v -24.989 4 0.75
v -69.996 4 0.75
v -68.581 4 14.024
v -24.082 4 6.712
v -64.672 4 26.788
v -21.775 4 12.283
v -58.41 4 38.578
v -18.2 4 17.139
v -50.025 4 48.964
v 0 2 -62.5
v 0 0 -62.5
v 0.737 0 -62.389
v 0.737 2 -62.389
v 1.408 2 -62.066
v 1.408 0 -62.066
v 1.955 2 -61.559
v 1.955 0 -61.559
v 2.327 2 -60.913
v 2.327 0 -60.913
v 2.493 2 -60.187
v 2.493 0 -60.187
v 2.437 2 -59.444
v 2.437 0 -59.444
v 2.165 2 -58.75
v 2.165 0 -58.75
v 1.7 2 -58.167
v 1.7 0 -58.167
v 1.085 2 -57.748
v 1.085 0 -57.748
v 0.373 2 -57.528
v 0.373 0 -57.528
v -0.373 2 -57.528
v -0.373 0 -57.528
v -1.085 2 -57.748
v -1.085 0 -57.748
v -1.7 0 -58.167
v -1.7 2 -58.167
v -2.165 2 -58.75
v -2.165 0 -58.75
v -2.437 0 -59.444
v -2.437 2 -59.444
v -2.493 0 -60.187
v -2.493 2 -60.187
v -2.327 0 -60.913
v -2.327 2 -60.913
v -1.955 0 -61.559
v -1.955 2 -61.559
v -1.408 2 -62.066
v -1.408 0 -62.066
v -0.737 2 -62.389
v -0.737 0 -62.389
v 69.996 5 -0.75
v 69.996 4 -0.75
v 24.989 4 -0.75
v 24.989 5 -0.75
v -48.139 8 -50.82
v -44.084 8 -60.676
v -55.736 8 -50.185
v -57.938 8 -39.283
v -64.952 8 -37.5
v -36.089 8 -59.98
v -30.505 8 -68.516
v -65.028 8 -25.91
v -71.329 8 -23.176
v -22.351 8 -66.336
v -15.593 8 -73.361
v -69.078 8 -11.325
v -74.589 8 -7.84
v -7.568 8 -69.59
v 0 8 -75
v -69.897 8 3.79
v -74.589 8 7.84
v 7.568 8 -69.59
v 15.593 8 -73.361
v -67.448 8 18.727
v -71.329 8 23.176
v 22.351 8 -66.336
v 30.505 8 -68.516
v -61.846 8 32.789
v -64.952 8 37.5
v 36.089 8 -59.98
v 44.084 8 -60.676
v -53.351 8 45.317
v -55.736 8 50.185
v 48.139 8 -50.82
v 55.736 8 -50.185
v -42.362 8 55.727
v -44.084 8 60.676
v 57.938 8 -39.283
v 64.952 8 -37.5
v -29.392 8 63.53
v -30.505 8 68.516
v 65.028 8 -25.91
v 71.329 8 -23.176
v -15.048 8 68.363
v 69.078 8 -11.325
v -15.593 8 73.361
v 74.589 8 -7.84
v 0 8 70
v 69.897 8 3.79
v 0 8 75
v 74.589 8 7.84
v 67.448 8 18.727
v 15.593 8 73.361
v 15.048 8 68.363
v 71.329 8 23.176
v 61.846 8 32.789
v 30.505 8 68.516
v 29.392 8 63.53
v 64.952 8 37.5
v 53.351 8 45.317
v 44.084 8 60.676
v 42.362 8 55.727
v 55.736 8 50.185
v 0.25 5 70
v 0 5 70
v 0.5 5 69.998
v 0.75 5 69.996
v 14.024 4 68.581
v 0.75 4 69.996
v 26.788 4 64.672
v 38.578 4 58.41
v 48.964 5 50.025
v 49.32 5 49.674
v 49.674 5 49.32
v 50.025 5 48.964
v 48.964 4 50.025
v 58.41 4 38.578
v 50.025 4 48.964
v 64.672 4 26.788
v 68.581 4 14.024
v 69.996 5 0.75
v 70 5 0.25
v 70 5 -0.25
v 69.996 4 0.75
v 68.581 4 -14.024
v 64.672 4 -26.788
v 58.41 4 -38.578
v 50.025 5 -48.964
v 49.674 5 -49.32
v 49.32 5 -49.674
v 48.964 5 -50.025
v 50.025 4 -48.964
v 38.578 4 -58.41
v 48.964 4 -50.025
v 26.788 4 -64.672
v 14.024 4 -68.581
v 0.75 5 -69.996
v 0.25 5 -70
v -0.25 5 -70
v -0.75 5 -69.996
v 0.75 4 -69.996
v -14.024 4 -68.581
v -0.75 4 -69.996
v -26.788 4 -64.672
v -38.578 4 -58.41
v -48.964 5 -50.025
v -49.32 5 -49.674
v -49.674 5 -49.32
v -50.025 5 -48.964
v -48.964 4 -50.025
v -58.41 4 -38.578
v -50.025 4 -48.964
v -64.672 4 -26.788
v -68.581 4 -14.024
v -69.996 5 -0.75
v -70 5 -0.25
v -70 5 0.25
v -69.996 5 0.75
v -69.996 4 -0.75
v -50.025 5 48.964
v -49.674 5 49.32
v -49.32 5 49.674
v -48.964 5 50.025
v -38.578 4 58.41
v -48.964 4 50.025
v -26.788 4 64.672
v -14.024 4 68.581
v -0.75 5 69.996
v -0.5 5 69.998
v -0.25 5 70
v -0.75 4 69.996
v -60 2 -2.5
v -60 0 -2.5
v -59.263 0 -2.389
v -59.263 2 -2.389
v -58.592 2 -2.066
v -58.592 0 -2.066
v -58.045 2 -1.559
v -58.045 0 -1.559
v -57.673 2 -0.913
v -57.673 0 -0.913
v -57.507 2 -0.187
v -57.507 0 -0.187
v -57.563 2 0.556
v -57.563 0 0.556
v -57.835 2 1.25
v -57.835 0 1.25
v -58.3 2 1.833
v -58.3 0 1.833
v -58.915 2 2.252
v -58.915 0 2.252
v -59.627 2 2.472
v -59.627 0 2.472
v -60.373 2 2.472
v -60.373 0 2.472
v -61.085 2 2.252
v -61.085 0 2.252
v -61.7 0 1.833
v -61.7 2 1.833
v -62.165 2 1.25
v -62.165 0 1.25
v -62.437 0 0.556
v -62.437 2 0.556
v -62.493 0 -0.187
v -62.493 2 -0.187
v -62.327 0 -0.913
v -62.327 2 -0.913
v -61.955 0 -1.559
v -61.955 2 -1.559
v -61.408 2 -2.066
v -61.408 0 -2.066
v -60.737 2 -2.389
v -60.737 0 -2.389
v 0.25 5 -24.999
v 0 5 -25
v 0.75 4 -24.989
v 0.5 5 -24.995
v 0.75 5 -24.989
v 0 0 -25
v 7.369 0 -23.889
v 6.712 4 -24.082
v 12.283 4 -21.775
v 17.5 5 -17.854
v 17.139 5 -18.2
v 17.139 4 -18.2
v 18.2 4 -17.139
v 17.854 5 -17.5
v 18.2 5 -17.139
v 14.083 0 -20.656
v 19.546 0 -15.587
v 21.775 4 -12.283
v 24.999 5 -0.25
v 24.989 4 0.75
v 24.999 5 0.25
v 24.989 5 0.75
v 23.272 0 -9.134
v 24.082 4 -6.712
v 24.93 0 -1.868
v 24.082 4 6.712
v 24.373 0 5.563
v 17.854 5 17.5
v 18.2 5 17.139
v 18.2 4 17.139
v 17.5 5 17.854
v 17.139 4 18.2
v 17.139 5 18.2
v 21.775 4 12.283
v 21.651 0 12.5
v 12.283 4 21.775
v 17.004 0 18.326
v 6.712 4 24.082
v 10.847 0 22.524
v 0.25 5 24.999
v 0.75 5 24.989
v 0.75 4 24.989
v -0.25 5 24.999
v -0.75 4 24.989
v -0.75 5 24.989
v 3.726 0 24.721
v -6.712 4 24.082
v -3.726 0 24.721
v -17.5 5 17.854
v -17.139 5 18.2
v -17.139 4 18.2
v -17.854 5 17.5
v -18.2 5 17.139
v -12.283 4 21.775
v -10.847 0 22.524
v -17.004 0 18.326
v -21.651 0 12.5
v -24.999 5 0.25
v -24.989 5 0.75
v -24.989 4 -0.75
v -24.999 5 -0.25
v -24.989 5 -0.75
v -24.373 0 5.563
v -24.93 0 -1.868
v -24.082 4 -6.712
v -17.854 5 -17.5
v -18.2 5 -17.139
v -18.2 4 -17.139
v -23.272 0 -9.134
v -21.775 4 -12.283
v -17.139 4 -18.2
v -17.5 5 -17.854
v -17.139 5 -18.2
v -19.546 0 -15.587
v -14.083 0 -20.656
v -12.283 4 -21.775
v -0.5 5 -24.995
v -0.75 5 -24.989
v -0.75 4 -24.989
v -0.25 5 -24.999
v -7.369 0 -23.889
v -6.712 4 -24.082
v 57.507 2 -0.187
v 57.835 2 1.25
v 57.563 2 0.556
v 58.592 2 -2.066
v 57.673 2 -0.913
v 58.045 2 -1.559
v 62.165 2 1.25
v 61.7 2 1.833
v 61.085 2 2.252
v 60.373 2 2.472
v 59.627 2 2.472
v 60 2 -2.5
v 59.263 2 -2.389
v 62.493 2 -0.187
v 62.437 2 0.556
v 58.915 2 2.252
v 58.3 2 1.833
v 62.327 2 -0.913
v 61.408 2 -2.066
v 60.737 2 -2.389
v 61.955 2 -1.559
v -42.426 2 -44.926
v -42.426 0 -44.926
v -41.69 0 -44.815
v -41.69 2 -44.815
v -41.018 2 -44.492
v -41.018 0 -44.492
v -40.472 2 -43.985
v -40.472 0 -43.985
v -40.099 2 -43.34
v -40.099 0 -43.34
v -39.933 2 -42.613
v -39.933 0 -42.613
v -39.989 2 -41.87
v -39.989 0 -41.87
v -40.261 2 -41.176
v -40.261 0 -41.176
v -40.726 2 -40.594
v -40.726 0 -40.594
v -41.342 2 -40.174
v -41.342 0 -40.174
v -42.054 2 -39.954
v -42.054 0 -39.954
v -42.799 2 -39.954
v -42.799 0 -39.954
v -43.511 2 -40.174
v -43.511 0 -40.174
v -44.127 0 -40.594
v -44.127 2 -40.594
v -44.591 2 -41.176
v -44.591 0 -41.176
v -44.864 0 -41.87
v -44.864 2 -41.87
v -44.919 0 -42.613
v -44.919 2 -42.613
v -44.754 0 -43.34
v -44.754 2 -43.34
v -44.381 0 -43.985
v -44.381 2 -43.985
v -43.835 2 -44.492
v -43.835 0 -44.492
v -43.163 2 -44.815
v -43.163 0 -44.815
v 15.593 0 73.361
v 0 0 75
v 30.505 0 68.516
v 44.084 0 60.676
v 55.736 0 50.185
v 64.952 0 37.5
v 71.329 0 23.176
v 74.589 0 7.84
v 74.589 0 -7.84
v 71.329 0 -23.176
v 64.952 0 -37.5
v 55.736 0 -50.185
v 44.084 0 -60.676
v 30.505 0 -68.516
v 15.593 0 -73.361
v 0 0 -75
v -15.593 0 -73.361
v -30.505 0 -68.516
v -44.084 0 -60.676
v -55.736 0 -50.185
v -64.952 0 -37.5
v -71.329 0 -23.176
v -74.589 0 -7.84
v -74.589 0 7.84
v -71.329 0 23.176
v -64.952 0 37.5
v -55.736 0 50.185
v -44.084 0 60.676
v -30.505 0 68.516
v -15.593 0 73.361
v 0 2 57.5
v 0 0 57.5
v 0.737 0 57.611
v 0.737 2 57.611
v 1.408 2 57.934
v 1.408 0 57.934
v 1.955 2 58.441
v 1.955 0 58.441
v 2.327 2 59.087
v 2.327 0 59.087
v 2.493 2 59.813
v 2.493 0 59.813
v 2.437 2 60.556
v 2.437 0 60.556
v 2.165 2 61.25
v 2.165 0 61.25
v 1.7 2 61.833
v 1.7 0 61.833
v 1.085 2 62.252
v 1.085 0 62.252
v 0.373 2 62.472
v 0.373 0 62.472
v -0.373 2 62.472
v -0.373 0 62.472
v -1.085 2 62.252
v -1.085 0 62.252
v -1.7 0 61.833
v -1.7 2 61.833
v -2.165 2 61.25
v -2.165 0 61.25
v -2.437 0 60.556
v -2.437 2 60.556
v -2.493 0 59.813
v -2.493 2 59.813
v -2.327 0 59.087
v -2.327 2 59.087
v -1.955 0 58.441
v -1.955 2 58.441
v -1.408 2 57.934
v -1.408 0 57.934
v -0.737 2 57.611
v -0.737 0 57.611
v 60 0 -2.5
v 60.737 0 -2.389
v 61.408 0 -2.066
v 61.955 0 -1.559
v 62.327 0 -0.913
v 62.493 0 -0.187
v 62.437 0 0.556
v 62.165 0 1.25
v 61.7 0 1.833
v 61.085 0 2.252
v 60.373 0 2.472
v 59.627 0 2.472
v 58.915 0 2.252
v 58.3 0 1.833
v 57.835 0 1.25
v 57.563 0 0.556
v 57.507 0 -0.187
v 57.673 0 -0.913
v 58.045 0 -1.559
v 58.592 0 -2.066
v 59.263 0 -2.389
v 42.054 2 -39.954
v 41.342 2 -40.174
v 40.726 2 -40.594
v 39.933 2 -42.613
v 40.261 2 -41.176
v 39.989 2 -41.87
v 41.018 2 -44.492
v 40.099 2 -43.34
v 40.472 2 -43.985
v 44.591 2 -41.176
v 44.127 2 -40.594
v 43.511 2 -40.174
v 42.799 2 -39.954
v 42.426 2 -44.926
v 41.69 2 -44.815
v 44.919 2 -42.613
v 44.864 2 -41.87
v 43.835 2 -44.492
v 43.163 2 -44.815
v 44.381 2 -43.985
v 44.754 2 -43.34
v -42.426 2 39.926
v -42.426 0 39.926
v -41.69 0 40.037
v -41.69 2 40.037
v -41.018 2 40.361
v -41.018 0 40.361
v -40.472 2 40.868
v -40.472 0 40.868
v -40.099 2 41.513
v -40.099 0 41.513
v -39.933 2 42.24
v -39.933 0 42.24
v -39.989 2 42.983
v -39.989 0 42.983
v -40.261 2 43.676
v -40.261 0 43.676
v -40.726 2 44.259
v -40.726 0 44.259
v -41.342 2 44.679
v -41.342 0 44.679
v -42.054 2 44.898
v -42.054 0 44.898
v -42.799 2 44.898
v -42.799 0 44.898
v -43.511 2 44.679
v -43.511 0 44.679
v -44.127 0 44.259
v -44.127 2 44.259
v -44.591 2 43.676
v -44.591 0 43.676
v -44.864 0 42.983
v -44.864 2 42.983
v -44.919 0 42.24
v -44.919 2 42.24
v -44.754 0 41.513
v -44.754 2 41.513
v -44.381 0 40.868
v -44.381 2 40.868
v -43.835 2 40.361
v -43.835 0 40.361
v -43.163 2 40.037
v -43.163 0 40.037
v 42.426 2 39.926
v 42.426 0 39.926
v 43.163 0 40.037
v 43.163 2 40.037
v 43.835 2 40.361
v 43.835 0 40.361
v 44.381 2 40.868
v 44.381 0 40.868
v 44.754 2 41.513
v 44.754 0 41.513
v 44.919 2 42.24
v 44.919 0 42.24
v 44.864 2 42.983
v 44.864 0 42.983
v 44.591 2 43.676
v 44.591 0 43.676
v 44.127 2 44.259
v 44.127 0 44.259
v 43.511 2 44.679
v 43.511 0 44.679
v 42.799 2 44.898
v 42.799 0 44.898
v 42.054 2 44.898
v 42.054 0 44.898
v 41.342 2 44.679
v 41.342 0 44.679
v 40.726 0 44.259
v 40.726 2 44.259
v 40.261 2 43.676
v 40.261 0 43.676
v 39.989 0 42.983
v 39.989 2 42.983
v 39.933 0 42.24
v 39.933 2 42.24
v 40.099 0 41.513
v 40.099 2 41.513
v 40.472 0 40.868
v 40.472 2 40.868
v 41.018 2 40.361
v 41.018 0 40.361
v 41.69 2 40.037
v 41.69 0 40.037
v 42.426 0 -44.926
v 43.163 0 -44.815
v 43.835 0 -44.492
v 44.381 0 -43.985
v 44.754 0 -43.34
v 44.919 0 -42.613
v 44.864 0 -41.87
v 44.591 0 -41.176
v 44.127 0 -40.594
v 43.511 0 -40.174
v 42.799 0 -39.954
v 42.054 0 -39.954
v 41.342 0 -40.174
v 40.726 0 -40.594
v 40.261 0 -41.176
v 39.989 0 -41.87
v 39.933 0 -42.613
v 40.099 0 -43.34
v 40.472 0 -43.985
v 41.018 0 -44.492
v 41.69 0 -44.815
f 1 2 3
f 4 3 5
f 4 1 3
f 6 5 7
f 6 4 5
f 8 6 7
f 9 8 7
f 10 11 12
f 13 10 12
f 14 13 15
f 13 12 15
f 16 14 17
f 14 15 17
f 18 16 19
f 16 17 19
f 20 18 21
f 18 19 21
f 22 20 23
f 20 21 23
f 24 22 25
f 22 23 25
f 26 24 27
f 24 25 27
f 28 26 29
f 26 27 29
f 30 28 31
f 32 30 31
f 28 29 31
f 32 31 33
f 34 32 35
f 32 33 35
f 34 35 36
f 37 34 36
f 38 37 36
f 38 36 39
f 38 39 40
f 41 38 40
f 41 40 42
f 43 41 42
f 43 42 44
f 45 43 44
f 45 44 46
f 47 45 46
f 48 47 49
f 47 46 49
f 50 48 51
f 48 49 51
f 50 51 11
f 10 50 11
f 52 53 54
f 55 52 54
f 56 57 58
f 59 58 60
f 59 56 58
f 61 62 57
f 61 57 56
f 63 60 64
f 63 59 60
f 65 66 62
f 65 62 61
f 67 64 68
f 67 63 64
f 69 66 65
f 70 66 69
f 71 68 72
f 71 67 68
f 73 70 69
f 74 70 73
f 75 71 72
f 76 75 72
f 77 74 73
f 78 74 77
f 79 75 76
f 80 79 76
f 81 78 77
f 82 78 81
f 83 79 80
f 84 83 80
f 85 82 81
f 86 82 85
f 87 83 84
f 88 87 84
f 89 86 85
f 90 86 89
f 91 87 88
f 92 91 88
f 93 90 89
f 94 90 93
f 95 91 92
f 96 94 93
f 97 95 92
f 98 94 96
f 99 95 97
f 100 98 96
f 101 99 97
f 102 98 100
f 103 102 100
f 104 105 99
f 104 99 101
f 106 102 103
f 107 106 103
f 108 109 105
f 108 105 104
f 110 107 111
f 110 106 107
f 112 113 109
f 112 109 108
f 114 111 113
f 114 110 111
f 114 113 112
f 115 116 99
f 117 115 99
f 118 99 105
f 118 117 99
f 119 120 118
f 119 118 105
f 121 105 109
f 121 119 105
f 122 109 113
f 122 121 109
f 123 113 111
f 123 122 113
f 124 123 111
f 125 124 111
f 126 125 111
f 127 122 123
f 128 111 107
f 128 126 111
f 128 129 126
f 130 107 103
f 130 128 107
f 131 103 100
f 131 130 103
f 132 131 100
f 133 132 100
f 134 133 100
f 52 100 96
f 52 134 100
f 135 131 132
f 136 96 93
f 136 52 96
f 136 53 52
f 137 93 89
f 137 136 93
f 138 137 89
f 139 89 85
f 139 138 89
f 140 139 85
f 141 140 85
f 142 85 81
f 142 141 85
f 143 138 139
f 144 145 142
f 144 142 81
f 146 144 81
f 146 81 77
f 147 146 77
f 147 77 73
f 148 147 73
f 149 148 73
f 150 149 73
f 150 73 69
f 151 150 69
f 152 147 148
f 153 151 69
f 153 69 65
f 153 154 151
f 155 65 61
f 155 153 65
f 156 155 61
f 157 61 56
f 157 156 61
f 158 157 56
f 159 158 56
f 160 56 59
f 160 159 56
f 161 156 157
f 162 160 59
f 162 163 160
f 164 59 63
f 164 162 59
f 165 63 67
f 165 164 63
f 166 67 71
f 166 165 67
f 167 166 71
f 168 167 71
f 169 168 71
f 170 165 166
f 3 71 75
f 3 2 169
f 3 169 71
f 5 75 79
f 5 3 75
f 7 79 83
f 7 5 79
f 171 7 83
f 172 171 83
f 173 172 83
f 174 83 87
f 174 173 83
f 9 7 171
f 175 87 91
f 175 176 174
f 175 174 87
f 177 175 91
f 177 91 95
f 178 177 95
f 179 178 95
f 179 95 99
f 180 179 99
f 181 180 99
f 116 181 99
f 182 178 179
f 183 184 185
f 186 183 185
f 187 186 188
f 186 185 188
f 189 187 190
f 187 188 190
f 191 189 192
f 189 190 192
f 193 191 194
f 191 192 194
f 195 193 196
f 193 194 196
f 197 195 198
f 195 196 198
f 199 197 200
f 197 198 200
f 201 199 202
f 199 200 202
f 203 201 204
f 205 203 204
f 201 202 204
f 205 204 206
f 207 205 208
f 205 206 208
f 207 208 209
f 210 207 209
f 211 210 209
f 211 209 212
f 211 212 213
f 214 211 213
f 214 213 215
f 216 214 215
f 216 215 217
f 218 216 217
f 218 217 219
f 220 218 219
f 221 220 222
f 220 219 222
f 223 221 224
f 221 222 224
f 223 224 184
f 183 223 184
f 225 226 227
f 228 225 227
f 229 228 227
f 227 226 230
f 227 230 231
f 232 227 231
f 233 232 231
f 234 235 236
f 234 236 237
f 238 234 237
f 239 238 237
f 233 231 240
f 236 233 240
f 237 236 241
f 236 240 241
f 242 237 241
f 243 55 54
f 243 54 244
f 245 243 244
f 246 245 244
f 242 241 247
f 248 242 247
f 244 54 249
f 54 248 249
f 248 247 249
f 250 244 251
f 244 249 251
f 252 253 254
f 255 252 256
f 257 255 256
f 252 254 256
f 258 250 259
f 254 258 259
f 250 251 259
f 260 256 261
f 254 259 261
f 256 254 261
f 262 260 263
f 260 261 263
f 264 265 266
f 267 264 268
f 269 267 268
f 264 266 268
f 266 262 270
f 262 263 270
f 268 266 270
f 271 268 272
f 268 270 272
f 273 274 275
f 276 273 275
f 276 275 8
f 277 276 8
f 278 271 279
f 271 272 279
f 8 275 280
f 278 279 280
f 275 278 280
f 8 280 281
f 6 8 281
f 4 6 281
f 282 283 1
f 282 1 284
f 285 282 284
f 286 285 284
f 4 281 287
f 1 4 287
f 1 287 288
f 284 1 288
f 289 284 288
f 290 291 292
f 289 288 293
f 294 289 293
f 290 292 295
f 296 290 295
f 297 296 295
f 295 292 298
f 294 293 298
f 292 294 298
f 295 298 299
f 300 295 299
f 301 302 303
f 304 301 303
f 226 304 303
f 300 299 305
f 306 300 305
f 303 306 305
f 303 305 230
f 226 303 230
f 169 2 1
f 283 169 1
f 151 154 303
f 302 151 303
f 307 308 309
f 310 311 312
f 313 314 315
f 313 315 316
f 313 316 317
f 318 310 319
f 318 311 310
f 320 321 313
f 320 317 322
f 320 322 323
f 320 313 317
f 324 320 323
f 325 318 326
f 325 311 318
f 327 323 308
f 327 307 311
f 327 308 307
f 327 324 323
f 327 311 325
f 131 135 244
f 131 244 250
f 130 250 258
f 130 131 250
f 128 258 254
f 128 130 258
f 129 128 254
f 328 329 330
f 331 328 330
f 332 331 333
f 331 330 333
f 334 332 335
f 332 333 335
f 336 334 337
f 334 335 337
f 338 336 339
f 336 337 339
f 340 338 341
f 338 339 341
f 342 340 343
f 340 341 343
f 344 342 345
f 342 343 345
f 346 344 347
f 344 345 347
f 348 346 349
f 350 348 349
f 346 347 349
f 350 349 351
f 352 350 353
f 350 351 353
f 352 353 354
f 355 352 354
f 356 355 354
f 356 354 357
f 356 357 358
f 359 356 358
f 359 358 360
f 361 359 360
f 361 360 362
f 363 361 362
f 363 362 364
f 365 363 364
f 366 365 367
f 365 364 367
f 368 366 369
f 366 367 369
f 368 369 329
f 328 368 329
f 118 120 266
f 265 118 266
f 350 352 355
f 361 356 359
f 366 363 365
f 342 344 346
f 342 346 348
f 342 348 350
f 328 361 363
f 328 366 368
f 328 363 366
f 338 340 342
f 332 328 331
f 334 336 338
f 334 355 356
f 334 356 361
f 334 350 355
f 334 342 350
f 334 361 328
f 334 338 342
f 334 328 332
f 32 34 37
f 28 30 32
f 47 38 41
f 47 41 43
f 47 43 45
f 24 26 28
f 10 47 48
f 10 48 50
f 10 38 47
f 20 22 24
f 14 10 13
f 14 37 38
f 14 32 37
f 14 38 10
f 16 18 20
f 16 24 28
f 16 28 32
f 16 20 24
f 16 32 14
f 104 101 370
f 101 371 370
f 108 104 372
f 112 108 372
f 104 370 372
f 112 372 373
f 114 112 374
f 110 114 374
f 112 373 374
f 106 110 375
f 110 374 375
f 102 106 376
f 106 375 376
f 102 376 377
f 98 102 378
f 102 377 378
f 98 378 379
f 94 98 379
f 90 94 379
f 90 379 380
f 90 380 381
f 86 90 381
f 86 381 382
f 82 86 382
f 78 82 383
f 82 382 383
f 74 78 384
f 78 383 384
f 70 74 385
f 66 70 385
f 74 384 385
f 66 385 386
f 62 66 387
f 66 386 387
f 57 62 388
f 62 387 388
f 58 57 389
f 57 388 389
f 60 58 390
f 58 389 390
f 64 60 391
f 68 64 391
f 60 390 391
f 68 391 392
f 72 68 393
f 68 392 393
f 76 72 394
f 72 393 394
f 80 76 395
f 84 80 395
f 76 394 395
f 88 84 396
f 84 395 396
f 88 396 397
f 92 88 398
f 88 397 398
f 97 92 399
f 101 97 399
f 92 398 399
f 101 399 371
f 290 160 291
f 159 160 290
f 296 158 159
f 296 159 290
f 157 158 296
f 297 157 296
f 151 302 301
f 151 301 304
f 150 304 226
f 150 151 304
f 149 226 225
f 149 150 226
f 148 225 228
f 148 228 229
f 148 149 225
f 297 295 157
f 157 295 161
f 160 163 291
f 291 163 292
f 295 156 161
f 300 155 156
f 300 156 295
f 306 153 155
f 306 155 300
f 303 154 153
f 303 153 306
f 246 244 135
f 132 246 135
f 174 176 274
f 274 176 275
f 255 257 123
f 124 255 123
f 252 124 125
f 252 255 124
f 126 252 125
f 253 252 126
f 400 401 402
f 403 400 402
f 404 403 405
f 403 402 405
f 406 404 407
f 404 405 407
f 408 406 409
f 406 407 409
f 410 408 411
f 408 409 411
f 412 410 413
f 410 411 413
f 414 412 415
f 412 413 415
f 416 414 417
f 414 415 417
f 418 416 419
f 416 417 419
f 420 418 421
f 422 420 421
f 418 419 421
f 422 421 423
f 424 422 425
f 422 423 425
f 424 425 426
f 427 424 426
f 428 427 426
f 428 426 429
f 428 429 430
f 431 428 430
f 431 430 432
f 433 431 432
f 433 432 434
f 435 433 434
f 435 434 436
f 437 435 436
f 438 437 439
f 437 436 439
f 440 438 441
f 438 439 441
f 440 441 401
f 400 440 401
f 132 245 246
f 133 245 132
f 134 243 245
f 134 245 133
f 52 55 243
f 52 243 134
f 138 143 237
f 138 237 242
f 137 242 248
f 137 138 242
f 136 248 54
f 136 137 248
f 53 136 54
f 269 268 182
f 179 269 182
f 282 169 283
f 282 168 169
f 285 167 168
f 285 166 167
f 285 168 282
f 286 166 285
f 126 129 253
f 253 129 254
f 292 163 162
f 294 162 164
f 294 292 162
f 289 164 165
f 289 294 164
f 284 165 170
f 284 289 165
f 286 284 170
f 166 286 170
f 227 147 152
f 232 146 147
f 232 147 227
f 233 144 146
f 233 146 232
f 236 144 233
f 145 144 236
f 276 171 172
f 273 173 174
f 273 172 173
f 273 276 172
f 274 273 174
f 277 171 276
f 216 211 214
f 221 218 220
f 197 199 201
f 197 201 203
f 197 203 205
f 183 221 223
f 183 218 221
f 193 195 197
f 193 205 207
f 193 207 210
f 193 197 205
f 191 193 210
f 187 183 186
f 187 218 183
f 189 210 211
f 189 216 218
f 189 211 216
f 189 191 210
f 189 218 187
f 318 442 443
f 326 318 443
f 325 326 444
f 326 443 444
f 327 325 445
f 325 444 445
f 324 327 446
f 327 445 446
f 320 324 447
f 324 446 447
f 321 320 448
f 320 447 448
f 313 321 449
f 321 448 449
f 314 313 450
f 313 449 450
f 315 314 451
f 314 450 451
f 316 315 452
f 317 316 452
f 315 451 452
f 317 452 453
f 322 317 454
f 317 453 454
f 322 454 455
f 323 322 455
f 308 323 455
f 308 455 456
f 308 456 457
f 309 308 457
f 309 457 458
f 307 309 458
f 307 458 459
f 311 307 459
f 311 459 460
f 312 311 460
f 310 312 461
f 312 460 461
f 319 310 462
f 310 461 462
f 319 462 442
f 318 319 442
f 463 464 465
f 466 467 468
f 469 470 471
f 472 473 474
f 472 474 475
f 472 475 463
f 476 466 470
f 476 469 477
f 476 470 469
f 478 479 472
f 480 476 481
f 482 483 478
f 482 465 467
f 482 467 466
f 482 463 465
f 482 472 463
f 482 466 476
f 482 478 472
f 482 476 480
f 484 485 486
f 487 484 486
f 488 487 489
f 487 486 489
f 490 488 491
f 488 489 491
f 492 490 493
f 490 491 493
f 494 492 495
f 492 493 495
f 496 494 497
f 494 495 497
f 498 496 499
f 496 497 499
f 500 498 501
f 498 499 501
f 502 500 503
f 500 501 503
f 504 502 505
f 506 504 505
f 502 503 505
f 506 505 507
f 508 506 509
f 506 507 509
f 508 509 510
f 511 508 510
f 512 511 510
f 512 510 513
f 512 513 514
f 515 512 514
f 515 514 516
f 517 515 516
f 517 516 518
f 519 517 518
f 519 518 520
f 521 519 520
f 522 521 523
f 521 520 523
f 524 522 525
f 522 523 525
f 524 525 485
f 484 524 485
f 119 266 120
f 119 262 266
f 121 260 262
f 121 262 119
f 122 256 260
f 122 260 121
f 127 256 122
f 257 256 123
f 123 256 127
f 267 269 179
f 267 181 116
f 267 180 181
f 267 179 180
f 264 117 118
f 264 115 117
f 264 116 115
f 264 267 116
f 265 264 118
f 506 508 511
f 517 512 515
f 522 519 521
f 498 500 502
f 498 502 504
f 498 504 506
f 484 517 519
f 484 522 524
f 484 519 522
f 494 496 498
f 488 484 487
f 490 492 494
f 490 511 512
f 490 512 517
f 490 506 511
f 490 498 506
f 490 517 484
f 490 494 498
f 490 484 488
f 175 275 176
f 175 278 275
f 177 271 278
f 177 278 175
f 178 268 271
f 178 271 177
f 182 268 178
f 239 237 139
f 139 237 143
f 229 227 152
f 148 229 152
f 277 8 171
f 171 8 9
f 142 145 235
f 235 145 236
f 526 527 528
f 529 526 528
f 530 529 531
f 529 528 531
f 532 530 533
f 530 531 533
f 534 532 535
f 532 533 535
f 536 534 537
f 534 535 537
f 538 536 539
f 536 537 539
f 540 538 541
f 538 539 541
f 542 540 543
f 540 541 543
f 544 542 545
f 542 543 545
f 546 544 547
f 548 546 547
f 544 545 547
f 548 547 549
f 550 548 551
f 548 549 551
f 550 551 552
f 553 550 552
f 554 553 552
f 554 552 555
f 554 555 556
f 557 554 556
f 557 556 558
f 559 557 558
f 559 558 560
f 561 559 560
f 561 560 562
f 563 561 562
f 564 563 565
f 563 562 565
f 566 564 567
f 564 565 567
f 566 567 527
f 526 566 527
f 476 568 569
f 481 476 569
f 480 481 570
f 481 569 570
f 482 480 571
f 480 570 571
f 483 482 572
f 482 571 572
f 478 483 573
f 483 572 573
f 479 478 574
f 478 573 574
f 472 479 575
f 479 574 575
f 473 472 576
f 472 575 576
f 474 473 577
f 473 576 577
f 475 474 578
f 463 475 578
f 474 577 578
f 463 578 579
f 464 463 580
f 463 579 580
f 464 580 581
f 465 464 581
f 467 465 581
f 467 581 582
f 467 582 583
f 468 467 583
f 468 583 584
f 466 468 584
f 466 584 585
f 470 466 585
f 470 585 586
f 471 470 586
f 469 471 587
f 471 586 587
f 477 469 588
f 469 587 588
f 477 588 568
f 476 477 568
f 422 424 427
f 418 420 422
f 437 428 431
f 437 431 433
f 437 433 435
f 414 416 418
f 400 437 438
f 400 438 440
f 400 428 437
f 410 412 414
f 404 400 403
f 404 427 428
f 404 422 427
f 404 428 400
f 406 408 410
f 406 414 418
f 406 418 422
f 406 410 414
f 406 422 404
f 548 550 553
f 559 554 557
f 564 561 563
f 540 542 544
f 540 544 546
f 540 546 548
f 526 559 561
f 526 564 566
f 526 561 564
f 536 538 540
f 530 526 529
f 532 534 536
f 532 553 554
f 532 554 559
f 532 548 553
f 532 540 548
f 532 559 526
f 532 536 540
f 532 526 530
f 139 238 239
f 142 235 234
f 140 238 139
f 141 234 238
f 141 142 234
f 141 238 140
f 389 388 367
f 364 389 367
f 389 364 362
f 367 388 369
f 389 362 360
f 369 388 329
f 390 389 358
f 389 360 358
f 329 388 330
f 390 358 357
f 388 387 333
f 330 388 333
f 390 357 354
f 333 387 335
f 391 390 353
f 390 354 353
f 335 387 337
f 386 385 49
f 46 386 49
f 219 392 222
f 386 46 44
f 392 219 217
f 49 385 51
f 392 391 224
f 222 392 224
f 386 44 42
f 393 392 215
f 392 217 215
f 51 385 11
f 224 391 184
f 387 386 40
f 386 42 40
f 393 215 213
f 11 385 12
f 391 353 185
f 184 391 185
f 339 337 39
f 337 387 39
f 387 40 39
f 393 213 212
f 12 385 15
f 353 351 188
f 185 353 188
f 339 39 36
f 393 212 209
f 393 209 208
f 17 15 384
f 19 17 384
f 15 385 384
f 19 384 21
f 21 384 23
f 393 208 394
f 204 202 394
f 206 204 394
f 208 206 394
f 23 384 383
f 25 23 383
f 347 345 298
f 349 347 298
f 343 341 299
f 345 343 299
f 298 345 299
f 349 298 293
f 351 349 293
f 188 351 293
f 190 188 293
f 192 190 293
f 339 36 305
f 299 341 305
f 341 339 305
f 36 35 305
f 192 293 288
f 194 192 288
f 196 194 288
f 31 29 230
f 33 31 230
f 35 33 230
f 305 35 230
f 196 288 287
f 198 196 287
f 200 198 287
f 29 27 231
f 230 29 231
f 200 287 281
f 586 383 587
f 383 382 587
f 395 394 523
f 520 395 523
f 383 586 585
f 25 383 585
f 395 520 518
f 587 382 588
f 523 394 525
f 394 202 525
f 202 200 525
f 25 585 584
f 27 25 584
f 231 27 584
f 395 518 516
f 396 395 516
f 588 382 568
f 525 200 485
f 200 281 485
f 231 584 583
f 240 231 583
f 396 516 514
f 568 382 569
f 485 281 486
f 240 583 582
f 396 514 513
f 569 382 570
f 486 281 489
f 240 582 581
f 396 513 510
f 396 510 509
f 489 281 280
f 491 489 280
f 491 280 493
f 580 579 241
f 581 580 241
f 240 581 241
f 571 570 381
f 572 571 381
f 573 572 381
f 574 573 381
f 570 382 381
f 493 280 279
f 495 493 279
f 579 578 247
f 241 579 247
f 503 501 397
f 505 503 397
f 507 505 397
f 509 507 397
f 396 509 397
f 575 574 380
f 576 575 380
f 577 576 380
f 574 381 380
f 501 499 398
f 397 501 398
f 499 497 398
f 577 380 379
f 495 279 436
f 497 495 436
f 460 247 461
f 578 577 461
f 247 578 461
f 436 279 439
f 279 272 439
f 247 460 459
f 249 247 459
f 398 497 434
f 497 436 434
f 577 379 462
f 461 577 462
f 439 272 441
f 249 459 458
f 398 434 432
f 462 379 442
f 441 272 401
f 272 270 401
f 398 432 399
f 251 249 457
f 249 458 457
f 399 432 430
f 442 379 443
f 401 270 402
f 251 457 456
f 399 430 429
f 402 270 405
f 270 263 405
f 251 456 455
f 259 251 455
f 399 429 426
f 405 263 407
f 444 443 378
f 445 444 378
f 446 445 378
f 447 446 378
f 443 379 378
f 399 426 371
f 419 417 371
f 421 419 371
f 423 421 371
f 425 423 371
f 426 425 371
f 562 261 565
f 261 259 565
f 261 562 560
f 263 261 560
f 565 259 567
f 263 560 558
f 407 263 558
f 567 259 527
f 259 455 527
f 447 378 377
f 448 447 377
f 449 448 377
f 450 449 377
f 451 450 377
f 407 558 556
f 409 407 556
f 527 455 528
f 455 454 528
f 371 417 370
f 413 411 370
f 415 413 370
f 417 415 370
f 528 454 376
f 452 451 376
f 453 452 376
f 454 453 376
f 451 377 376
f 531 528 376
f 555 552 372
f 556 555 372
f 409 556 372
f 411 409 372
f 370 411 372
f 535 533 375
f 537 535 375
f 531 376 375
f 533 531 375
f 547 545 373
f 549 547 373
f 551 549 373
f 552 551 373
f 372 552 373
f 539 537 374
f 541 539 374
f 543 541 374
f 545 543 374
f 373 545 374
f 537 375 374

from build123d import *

# Parameters (mm, degrees)
CROQUIS1_R              = 75
SALIENTE_EXTRUIR1_DEPTH = 4
CROQUIS3_R              = 75
CROQUIS3_R_2            = 70
SALIENTE_EXTRUIR2_DEPTH = 4
SALIENTE_EXTRUIR3_DEPTH = 1
CROQUIS2_R              = 2.5
CORTAR_EXTRUIR1_DEPTH   = 2
CROQUIS4_R              = 25
CORTAR_EXTRUIR2_DEPTH   = 6


with BuildPart() as part:
    # Croquis1 → Saliente-Extruir1 (new body)
    with BuildSketch(Plane(origin=(0, 0, 0), x_dir=(1, 0, 0), z_dir=(0, 1, 0))):
        with Locations(Location((0, 0, 0), (0, 0, 270))):
            Circle(CROQUIS1_R)
    extrude(amount=SALIENTE_EXTRUIR1_DEPTH)

    # Croquis3 → Saliente-Extruir2 (add)
    with BuildSketch(Plane(origin=(0, 4, 0), x_dir=(1, 0, 0), z_dir=(0, 1, 0))):
        with Locations(Location((0, 0, 0), (0, 0, 270))):
            Circle(CROQUIS3_R)
        with Locations(Location((0, 0, 0), (0, 0, 270))):
            Circle(CROQUIS3_R_2, mode=Mode.SUBTRACT)
    extrude(amount=SALIENTE_EXTRUIR2_DEPTH)

    # Croquis7 → Saliente-Extruir3 (add)
    with BuildSketch(Plane(origin=(0, 4, 0), x_dir=(1, 0, 0), z_dir=(0, 1, 0))):
        Polygon((0.75, -1.810660172), (51.618795027, -52.679455198), (52.679455198, -51.618795027), (1.810660172, -0.75), (73.75, -0.75), (73.75, 0.75), (1.810660172, 0.75), (52.679455198, 51.618795027), (51.618795027, 52.679455198), (0.75, 1.810660172), (0.75, 73.75), (-0.75, 73.75), (-0.75, 1.810660172), (-51.618795027, 52.679455198), (-52.679455198, 51.618795027), (-1.810660172, 0.75), (-73.75, 0.75), (-73.75, -0.75), (-1.810660172, -0.75), (-52.679455198, -51.618795027), (-51.618795027, -52.679455198), (-0.75, -1.810660172), (-0.75, -73.75), (0.75, -73.75), align=None)
    extrude(amount=SALIENTE_EXTRUIR3_DEPTH)

    # Croquis2 → Cortar-Extruir1 (cut)
    with BuildSketch(Plane.XZ):
        with Locations(Location((-60, 0, 0), (0, 0, 270))):
            Circle(CROQUIS2_R)
        with Locations(Location((-42.426406871, 42.426406871, 0), (0, 0, 270))):
            Circle(CROQUIS2_R)
        with Locations(Location((0, 60, 0), (0, 0, 270))):
            Circle(CROQUIS2_R)
        with Locations(Location((42.426406871, 42.426406871, 0), (0, 0, 270))):
            Circle(CROQUIS2_R)
        with Locations(Location((60, 0, 0), (0, 0, 270))):
            Circle(CROQUIS2_R)
        with Locations(Location((42.426406871, -42.426406871, 0), (0, 0, 270))):
            Circle(CROQUIS2_R)
        with Locations(Location((0, -60, 0), (0, 0, 270))):
            Circle(CROQUIS2_R)
        with Locations(Location((-42.426406871, -42.426406871, 0), (0, 0, 270))):
            Circle(CROQUIS2_R)
    extrude(amount=-CORTAR_EXTRUIR1_DEPTH, mode=Mode.SUBTRACT)

    # Croquis4 → Cortar-Extruir2 (cut)
    with BuildSketch(Plane.XZ):
        with Locations(Location((0, 0, 0), (0, 0, 270))):
            Circle(CROQUIS4_R)
    extrude(amount=-CORTAR_EXTRUIR2_DEPTH, mode=Mode.SUBTRACT)


solid = part.part
